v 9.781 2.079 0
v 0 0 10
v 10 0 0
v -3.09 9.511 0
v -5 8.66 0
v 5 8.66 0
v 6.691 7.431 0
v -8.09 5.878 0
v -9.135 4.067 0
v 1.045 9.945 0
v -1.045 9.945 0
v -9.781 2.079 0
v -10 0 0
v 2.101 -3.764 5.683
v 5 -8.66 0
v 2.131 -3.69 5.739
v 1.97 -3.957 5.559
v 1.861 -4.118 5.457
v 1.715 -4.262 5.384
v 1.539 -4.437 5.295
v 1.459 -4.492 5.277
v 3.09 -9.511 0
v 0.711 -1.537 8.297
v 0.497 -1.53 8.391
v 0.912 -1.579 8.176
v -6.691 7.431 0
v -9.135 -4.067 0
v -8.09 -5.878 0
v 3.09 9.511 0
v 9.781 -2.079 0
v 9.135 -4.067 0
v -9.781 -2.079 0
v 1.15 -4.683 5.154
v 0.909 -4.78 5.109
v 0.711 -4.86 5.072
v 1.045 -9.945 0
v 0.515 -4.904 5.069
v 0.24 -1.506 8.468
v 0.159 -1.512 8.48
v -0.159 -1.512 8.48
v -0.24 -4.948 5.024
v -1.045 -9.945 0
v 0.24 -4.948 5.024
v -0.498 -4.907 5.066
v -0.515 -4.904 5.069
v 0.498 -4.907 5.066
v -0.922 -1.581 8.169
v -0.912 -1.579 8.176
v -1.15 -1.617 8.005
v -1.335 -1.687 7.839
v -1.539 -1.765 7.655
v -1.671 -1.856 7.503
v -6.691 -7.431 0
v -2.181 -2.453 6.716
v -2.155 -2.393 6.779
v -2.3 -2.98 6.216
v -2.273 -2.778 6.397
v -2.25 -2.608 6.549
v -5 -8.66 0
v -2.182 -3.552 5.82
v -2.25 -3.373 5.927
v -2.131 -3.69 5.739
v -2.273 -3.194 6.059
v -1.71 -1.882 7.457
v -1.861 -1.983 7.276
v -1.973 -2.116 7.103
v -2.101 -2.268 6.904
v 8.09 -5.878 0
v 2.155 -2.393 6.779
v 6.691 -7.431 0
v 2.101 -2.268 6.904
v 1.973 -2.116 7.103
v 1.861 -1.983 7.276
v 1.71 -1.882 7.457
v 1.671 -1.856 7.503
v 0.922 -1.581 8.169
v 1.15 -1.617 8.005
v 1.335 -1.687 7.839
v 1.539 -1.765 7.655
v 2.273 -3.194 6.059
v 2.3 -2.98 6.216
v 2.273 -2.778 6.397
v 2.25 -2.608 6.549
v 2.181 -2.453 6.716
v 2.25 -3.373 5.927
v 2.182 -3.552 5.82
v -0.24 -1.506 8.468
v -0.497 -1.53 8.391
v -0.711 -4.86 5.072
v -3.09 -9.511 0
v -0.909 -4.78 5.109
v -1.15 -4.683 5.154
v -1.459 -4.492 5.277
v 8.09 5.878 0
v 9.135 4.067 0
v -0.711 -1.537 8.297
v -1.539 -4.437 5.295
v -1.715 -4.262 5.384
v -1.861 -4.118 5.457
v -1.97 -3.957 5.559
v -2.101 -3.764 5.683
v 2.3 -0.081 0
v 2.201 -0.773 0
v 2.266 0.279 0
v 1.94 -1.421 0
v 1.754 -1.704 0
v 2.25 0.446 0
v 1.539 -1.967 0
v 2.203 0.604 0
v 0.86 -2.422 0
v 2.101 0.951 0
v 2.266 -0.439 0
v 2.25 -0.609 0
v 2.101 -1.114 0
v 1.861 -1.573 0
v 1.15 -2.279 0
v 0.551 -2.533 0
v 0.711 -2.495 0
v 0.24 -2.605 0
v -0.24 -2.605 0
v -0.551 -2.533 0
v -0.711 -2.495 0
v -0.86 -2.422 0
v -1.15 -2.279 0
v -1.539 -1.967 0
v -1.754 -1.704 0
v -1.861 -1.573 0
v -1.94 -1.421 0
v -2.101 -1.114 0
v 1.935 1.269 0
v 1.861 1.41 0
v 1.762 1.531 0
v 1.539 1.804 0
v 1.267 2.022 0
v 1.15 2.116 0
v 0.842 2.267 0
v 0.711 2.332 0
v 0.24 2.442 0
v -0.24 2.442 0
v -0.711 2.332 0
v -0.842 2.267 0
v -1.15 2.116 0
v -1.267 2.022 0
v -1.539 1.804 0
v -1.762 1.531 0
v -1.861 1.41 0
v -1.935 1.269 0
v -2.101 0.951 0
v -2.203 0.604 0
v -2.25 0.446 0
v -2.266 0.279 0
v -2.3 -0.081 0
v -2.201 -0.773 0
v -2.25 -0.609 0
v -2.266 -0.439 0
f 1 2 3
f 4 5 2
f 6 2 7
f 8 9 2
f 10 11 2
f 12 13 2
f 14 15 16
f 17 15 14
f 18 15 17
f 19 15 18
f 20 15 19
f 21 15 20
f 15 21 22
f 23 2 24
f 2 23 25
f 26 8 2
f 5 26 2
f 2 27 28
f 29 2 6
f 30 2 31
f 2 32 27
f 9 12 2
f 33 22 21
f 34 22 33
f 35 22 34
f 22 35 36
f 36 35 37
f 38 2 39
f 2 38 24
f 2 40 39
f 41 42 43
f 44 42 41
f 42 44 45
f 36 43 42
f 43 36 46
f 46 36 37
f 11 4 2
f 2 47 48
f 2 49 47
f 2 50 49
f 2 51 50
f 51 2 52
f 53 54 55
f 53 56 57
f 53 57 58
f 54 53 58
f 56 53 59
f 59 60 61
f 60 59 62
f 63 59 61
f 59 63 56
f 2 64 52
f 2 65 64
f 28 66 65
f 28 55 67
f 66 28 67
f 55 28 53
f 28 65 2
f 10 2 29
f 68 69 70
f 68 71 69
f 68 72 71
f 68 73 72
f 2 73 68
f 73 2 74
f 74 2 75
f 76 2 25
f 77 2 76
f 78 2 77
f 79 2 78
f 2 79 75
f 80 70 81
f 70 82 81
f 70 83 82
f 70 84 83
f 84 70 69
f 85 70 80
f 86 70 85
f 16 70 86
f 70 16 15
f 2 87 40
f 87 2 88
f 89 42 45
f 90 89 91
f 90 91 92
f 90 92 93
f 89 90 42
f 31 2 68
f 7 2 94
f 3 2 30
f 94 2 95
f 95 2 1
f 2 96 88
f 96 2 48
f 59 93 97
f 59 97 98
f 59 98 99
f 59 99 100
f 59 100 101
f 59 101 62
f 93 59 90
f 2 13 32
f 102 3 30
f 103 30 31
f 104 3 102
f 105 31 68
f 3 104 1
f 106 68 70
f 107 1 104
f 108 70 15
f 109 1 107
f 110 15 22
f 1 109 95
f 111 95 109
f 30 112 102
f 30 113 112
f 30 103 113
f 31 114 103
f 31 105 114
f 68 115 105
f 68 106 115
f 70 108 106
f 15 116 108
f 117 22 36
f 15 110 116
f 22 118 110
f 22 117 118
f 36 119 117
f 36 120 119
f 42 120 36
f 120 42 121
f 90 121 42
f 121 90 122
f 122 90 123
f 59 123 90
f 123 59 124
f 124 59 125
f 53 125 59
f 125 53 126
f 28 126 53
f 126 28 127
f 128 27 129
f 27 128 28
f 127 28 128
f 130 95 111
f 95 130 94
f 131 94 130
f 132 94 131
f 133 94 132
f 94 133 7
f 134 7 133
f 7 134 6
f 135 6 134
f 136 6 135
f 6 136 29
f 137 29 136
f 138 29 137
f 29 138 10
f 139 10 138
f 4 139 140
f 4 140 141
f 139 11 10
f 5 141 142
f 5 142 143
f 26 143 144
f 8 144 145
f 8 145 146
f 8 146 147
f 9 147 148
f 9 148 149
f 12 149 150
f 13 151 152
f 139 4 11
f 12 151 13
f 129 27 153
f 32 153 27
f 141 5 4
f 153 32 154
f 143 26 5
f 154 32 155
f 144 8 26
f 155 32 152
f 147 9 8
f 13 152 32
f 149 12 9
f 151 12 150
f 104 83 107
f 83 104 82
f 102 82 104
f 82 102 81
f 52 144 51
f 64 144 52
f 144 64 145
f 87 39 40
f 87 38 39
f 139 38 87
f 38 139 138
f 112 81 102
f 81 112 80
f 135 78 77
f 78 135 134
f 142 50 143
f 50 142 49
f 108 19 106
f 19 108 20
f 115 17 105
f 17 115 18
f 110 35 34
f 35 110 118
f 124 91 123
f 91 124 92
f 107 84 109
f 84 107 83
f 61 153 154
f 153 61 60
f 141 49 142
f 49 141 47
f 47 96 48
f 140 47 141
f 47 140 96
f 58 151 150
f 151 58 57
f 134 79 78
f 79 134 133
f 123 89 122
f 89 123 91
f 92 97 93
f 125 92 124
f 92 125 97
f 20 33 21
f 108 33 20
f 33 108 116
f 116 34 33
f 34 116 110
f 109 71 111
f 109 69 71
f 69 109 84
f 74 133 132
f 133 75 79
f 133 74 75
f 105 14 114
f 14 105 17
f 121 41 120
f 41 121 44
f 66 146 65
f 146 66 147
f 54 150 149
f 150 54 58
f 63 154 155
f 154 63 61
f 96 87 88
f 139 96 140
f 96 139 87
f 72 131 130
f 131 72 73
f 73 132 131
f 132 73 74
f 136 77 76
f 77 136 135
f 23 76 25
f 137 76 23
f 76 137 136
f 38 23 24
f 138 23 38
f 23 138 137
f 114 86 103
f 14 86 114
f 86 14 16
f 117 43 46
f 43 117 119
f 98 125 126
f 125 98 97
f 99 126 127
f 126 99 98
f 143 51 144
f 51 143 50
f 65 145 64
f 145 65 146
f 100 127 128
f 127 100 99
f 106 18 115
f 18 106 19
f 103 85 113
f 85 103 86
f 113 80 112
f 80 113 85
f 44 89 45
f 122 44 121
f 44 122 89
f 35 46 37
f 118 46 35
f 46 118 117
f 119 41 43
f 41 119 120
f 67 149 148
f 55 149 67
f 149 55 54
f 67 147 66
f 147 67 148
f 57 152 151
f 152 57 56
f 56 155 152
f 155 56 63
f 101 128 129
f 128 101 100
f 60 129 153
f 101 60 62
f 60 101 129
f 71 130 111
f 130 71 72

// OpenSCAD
/**
 * Copyright 2018 Nathan Fairhurst.
 */

module pip(
  lean_angle, // the angle at which the umbrella will lean
  height, // how tall the cone should be
  width, // how wide the cone should be at the base
  wall_width, // how much space their should be between the hole edge and the cone edge
  pick_diameter, // the diameter of a toothpick
  tolerance // Room for error
) {
  slot_offset = wall_width / cos(lean_angle);

  difference () {
    cylinder(height, width, 0);
    translate([0, 0, height])
      rotate([lean_angle,0,0])
        translate([0, -(wall_width + pick_diameter + tolerance), -2.5 * height])
          cylinder(5 * height, pick_diameter + tolerance, pick_diameter + tolerance);
  }
}

pip(
  25, // lean_angle
  10, // height
  10, // width
  2, // wall_width
  2, // pick_diameter
  0.3, // tolerance
  $fn=30
);
